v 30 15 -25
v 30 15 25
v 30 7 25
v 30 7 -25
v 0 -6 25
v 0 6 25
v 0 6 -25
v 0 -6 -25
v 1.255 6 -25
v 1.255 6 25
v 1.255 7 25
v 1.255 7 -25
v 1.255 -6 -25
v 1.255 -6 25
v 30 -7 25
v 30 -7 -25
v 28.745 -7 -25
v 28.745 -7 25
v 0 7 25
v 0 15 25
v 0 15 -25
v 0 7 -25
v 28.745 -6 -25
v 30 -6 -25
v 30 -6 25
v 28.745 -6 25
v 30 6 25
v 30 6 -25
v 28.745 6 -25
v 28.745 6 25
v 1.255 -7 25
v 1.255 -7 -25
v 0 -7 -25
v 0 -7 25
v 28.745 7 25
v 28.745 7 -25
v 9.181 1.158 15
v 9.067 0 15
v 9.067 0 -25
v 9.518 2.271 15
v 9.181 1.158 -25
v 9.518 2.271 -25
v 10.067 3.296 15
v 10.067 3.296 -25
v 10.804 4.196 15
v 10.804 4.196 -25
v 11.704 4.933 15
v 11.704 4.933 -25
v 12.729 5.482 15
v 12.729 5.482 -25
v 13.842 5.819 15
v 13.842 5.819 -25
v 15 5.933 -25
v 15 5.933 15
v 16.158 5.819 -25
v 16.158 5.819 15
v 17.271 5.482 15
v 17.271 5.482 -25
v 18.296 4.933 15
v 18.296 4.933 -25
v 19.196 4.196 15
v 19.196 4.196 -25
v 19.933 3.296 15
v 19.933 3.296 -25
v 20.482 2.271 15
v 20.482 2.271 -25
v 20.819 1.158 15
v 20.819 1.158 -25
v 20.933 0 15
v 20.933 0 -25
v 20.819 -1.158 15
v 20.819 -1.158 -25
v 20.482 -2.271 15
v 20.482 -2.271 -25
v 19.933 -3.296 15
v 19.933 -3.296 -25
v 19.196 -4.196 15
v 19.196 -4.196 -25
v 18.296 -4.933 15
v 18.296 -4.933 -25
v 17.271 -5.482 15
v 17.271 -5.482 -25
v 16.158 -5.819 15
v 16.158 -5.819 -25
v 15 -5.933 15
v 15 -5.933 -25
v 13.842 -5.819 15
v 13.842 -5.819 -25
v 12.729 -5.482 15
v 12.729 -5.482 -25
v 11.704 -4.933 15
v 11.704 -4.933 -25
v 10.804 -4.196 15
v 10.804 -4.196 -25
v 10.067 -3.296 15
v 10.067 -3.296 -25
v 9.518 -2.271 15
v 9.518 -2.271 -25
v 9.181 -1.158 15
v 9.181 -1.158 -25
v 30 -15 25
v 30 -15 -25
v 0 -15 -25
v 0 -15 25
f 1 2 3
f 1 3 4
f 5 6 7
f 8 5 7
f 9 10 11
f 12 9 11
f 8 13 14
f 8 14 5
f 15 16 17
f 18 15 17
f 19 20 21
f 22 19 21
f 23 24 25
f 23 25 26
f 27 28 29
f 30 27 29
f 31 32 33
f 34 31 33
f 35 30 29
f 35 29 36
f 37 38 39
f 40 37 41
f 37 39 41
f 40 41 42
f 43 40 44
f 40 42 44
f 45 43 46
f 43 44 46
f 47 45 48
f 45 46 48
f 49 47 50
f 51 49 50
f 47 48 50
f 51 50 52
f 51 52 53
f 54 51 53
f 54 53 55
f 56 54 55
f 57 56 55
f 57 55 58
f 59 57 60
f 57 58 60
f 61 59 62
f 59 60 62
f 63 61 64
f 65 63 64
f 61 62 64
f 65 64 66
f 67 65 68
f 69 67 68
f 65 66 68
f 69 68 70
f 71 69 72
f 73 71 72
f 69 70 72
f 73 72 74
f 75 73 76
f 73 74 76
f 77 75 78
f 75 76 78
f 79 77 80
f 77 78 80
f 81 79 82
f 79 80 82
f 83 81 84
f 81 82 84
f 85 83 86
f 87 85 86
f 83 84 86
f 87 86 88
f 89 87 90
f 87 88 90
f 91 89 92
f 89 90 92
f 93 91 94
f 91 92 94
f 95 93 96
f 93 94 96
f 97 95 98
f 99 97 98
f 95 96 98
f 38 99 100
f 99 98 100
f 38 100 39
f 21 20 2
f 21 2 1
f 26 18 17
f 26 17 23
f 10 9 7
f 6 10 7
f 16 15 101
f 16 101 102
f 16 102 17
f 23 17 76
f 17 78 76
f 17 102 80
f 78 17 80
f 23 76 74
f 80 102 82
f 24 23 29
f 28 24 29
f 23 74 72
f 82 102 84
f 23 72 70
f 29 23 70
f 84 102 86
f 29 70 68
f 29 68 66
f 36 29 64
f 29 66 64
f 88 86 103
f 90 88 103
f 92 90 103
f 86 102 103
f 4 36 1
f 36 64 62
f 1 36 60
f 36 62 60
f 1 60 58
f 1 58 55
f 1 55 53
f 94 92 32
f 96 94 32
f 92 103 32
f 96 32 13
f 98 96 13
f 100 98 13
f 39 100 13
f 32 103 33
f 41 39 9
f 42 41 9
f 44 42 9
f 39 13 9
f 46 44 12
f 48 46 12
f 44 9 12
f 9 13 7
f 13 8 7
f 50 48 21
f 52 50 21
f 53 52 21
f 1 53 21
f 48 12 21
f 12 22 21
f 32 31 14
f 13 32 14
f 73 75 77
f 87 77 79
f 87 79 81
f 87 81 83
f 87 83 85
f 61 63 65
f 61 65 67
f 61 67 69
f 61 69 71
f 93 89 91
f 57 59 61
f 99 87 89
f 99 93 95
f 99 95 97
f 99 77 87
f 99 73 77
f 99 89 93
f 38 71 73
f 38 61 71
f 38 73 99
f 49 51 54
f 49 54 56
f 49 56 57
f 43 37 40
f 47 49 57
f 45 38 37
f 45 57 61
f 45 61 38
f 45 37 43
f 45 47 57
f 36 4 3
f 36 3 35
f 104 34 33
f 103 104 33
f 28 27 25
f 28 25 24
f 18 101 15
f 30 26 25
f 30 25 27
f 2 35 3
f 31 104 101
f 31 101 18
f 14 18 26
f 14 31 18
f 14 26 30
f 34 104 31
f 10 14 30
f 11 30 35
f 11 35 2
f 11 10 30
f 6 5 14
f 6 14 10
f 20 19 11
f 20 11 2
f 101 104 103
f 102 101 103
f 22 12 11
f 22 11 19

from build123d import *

# Parameters (mm, degrees)
SKETCH1_W           = 50
SKETCH1_H           = 30
BOSS_EXTRUDE1_DEPTH = 30
SKETCH3_R           = 5.933342005
CUT_EXTRUDE1_DEPTH  = 40
SKETCH4_W           = 1.254965376
SKETCH4_H           = 1
CUT_EXTRUDE2_DEPTH  = 51


with BuildPart() as part:
    # Sketch1 → Boss-Extrude1 (new body)
    with BuildSketch(Plane(origin=(0, 0, 0), x_dir=(0, 0, -1), z_dir=(1, 0, 0))):
        Rectangle(SKETCH1_W, SKETCH1_H)
    extrude(amount=BOSS_EXTRUDE1_DEPTH)

    # Sketch3 → Cut-Extrude1 (cut)
    with BuildSketch(Plane(origin=(0, 0, -25), x_dir=(-1, 0, 0), z_dir=(0, 0, -1))):
        with Locations((-15, 0)):
            Circle(SKETCH3_R)
    extrude(amount=-CUT_EXTRUDE1_DEPTH, mode=Mode.SUBTRACT)

    # Sketch4 → Cut-Extrude2 (cut, through all)
    with BuildSketch(Plane(origin=(0, 0, -25), x_dir=(-1, 0, 0), z_dir=(0, 0, -1))):
        with Locations((-29.372517312, 6.5)):
            Rectangle(SKETCH4_W, SKETCH4_H)
        with Locations((-29.372517312, -6.5)):
            Rectangle(SKETCH4_W, SKETCH4_H)
        with Locations((-0.627482688, -6.5)):
            Rectangle(SKETCH4_W, SKETCH4_H)
        with Locations((-0.627482688, 6.5)):
            Rectangle(SKETCH4_W, SKETCH4_H)
    extrude(amount=-CUT_EXTRUDE2_DEPTH, mode=Mode.SUBTRACT)


solid = part.part
